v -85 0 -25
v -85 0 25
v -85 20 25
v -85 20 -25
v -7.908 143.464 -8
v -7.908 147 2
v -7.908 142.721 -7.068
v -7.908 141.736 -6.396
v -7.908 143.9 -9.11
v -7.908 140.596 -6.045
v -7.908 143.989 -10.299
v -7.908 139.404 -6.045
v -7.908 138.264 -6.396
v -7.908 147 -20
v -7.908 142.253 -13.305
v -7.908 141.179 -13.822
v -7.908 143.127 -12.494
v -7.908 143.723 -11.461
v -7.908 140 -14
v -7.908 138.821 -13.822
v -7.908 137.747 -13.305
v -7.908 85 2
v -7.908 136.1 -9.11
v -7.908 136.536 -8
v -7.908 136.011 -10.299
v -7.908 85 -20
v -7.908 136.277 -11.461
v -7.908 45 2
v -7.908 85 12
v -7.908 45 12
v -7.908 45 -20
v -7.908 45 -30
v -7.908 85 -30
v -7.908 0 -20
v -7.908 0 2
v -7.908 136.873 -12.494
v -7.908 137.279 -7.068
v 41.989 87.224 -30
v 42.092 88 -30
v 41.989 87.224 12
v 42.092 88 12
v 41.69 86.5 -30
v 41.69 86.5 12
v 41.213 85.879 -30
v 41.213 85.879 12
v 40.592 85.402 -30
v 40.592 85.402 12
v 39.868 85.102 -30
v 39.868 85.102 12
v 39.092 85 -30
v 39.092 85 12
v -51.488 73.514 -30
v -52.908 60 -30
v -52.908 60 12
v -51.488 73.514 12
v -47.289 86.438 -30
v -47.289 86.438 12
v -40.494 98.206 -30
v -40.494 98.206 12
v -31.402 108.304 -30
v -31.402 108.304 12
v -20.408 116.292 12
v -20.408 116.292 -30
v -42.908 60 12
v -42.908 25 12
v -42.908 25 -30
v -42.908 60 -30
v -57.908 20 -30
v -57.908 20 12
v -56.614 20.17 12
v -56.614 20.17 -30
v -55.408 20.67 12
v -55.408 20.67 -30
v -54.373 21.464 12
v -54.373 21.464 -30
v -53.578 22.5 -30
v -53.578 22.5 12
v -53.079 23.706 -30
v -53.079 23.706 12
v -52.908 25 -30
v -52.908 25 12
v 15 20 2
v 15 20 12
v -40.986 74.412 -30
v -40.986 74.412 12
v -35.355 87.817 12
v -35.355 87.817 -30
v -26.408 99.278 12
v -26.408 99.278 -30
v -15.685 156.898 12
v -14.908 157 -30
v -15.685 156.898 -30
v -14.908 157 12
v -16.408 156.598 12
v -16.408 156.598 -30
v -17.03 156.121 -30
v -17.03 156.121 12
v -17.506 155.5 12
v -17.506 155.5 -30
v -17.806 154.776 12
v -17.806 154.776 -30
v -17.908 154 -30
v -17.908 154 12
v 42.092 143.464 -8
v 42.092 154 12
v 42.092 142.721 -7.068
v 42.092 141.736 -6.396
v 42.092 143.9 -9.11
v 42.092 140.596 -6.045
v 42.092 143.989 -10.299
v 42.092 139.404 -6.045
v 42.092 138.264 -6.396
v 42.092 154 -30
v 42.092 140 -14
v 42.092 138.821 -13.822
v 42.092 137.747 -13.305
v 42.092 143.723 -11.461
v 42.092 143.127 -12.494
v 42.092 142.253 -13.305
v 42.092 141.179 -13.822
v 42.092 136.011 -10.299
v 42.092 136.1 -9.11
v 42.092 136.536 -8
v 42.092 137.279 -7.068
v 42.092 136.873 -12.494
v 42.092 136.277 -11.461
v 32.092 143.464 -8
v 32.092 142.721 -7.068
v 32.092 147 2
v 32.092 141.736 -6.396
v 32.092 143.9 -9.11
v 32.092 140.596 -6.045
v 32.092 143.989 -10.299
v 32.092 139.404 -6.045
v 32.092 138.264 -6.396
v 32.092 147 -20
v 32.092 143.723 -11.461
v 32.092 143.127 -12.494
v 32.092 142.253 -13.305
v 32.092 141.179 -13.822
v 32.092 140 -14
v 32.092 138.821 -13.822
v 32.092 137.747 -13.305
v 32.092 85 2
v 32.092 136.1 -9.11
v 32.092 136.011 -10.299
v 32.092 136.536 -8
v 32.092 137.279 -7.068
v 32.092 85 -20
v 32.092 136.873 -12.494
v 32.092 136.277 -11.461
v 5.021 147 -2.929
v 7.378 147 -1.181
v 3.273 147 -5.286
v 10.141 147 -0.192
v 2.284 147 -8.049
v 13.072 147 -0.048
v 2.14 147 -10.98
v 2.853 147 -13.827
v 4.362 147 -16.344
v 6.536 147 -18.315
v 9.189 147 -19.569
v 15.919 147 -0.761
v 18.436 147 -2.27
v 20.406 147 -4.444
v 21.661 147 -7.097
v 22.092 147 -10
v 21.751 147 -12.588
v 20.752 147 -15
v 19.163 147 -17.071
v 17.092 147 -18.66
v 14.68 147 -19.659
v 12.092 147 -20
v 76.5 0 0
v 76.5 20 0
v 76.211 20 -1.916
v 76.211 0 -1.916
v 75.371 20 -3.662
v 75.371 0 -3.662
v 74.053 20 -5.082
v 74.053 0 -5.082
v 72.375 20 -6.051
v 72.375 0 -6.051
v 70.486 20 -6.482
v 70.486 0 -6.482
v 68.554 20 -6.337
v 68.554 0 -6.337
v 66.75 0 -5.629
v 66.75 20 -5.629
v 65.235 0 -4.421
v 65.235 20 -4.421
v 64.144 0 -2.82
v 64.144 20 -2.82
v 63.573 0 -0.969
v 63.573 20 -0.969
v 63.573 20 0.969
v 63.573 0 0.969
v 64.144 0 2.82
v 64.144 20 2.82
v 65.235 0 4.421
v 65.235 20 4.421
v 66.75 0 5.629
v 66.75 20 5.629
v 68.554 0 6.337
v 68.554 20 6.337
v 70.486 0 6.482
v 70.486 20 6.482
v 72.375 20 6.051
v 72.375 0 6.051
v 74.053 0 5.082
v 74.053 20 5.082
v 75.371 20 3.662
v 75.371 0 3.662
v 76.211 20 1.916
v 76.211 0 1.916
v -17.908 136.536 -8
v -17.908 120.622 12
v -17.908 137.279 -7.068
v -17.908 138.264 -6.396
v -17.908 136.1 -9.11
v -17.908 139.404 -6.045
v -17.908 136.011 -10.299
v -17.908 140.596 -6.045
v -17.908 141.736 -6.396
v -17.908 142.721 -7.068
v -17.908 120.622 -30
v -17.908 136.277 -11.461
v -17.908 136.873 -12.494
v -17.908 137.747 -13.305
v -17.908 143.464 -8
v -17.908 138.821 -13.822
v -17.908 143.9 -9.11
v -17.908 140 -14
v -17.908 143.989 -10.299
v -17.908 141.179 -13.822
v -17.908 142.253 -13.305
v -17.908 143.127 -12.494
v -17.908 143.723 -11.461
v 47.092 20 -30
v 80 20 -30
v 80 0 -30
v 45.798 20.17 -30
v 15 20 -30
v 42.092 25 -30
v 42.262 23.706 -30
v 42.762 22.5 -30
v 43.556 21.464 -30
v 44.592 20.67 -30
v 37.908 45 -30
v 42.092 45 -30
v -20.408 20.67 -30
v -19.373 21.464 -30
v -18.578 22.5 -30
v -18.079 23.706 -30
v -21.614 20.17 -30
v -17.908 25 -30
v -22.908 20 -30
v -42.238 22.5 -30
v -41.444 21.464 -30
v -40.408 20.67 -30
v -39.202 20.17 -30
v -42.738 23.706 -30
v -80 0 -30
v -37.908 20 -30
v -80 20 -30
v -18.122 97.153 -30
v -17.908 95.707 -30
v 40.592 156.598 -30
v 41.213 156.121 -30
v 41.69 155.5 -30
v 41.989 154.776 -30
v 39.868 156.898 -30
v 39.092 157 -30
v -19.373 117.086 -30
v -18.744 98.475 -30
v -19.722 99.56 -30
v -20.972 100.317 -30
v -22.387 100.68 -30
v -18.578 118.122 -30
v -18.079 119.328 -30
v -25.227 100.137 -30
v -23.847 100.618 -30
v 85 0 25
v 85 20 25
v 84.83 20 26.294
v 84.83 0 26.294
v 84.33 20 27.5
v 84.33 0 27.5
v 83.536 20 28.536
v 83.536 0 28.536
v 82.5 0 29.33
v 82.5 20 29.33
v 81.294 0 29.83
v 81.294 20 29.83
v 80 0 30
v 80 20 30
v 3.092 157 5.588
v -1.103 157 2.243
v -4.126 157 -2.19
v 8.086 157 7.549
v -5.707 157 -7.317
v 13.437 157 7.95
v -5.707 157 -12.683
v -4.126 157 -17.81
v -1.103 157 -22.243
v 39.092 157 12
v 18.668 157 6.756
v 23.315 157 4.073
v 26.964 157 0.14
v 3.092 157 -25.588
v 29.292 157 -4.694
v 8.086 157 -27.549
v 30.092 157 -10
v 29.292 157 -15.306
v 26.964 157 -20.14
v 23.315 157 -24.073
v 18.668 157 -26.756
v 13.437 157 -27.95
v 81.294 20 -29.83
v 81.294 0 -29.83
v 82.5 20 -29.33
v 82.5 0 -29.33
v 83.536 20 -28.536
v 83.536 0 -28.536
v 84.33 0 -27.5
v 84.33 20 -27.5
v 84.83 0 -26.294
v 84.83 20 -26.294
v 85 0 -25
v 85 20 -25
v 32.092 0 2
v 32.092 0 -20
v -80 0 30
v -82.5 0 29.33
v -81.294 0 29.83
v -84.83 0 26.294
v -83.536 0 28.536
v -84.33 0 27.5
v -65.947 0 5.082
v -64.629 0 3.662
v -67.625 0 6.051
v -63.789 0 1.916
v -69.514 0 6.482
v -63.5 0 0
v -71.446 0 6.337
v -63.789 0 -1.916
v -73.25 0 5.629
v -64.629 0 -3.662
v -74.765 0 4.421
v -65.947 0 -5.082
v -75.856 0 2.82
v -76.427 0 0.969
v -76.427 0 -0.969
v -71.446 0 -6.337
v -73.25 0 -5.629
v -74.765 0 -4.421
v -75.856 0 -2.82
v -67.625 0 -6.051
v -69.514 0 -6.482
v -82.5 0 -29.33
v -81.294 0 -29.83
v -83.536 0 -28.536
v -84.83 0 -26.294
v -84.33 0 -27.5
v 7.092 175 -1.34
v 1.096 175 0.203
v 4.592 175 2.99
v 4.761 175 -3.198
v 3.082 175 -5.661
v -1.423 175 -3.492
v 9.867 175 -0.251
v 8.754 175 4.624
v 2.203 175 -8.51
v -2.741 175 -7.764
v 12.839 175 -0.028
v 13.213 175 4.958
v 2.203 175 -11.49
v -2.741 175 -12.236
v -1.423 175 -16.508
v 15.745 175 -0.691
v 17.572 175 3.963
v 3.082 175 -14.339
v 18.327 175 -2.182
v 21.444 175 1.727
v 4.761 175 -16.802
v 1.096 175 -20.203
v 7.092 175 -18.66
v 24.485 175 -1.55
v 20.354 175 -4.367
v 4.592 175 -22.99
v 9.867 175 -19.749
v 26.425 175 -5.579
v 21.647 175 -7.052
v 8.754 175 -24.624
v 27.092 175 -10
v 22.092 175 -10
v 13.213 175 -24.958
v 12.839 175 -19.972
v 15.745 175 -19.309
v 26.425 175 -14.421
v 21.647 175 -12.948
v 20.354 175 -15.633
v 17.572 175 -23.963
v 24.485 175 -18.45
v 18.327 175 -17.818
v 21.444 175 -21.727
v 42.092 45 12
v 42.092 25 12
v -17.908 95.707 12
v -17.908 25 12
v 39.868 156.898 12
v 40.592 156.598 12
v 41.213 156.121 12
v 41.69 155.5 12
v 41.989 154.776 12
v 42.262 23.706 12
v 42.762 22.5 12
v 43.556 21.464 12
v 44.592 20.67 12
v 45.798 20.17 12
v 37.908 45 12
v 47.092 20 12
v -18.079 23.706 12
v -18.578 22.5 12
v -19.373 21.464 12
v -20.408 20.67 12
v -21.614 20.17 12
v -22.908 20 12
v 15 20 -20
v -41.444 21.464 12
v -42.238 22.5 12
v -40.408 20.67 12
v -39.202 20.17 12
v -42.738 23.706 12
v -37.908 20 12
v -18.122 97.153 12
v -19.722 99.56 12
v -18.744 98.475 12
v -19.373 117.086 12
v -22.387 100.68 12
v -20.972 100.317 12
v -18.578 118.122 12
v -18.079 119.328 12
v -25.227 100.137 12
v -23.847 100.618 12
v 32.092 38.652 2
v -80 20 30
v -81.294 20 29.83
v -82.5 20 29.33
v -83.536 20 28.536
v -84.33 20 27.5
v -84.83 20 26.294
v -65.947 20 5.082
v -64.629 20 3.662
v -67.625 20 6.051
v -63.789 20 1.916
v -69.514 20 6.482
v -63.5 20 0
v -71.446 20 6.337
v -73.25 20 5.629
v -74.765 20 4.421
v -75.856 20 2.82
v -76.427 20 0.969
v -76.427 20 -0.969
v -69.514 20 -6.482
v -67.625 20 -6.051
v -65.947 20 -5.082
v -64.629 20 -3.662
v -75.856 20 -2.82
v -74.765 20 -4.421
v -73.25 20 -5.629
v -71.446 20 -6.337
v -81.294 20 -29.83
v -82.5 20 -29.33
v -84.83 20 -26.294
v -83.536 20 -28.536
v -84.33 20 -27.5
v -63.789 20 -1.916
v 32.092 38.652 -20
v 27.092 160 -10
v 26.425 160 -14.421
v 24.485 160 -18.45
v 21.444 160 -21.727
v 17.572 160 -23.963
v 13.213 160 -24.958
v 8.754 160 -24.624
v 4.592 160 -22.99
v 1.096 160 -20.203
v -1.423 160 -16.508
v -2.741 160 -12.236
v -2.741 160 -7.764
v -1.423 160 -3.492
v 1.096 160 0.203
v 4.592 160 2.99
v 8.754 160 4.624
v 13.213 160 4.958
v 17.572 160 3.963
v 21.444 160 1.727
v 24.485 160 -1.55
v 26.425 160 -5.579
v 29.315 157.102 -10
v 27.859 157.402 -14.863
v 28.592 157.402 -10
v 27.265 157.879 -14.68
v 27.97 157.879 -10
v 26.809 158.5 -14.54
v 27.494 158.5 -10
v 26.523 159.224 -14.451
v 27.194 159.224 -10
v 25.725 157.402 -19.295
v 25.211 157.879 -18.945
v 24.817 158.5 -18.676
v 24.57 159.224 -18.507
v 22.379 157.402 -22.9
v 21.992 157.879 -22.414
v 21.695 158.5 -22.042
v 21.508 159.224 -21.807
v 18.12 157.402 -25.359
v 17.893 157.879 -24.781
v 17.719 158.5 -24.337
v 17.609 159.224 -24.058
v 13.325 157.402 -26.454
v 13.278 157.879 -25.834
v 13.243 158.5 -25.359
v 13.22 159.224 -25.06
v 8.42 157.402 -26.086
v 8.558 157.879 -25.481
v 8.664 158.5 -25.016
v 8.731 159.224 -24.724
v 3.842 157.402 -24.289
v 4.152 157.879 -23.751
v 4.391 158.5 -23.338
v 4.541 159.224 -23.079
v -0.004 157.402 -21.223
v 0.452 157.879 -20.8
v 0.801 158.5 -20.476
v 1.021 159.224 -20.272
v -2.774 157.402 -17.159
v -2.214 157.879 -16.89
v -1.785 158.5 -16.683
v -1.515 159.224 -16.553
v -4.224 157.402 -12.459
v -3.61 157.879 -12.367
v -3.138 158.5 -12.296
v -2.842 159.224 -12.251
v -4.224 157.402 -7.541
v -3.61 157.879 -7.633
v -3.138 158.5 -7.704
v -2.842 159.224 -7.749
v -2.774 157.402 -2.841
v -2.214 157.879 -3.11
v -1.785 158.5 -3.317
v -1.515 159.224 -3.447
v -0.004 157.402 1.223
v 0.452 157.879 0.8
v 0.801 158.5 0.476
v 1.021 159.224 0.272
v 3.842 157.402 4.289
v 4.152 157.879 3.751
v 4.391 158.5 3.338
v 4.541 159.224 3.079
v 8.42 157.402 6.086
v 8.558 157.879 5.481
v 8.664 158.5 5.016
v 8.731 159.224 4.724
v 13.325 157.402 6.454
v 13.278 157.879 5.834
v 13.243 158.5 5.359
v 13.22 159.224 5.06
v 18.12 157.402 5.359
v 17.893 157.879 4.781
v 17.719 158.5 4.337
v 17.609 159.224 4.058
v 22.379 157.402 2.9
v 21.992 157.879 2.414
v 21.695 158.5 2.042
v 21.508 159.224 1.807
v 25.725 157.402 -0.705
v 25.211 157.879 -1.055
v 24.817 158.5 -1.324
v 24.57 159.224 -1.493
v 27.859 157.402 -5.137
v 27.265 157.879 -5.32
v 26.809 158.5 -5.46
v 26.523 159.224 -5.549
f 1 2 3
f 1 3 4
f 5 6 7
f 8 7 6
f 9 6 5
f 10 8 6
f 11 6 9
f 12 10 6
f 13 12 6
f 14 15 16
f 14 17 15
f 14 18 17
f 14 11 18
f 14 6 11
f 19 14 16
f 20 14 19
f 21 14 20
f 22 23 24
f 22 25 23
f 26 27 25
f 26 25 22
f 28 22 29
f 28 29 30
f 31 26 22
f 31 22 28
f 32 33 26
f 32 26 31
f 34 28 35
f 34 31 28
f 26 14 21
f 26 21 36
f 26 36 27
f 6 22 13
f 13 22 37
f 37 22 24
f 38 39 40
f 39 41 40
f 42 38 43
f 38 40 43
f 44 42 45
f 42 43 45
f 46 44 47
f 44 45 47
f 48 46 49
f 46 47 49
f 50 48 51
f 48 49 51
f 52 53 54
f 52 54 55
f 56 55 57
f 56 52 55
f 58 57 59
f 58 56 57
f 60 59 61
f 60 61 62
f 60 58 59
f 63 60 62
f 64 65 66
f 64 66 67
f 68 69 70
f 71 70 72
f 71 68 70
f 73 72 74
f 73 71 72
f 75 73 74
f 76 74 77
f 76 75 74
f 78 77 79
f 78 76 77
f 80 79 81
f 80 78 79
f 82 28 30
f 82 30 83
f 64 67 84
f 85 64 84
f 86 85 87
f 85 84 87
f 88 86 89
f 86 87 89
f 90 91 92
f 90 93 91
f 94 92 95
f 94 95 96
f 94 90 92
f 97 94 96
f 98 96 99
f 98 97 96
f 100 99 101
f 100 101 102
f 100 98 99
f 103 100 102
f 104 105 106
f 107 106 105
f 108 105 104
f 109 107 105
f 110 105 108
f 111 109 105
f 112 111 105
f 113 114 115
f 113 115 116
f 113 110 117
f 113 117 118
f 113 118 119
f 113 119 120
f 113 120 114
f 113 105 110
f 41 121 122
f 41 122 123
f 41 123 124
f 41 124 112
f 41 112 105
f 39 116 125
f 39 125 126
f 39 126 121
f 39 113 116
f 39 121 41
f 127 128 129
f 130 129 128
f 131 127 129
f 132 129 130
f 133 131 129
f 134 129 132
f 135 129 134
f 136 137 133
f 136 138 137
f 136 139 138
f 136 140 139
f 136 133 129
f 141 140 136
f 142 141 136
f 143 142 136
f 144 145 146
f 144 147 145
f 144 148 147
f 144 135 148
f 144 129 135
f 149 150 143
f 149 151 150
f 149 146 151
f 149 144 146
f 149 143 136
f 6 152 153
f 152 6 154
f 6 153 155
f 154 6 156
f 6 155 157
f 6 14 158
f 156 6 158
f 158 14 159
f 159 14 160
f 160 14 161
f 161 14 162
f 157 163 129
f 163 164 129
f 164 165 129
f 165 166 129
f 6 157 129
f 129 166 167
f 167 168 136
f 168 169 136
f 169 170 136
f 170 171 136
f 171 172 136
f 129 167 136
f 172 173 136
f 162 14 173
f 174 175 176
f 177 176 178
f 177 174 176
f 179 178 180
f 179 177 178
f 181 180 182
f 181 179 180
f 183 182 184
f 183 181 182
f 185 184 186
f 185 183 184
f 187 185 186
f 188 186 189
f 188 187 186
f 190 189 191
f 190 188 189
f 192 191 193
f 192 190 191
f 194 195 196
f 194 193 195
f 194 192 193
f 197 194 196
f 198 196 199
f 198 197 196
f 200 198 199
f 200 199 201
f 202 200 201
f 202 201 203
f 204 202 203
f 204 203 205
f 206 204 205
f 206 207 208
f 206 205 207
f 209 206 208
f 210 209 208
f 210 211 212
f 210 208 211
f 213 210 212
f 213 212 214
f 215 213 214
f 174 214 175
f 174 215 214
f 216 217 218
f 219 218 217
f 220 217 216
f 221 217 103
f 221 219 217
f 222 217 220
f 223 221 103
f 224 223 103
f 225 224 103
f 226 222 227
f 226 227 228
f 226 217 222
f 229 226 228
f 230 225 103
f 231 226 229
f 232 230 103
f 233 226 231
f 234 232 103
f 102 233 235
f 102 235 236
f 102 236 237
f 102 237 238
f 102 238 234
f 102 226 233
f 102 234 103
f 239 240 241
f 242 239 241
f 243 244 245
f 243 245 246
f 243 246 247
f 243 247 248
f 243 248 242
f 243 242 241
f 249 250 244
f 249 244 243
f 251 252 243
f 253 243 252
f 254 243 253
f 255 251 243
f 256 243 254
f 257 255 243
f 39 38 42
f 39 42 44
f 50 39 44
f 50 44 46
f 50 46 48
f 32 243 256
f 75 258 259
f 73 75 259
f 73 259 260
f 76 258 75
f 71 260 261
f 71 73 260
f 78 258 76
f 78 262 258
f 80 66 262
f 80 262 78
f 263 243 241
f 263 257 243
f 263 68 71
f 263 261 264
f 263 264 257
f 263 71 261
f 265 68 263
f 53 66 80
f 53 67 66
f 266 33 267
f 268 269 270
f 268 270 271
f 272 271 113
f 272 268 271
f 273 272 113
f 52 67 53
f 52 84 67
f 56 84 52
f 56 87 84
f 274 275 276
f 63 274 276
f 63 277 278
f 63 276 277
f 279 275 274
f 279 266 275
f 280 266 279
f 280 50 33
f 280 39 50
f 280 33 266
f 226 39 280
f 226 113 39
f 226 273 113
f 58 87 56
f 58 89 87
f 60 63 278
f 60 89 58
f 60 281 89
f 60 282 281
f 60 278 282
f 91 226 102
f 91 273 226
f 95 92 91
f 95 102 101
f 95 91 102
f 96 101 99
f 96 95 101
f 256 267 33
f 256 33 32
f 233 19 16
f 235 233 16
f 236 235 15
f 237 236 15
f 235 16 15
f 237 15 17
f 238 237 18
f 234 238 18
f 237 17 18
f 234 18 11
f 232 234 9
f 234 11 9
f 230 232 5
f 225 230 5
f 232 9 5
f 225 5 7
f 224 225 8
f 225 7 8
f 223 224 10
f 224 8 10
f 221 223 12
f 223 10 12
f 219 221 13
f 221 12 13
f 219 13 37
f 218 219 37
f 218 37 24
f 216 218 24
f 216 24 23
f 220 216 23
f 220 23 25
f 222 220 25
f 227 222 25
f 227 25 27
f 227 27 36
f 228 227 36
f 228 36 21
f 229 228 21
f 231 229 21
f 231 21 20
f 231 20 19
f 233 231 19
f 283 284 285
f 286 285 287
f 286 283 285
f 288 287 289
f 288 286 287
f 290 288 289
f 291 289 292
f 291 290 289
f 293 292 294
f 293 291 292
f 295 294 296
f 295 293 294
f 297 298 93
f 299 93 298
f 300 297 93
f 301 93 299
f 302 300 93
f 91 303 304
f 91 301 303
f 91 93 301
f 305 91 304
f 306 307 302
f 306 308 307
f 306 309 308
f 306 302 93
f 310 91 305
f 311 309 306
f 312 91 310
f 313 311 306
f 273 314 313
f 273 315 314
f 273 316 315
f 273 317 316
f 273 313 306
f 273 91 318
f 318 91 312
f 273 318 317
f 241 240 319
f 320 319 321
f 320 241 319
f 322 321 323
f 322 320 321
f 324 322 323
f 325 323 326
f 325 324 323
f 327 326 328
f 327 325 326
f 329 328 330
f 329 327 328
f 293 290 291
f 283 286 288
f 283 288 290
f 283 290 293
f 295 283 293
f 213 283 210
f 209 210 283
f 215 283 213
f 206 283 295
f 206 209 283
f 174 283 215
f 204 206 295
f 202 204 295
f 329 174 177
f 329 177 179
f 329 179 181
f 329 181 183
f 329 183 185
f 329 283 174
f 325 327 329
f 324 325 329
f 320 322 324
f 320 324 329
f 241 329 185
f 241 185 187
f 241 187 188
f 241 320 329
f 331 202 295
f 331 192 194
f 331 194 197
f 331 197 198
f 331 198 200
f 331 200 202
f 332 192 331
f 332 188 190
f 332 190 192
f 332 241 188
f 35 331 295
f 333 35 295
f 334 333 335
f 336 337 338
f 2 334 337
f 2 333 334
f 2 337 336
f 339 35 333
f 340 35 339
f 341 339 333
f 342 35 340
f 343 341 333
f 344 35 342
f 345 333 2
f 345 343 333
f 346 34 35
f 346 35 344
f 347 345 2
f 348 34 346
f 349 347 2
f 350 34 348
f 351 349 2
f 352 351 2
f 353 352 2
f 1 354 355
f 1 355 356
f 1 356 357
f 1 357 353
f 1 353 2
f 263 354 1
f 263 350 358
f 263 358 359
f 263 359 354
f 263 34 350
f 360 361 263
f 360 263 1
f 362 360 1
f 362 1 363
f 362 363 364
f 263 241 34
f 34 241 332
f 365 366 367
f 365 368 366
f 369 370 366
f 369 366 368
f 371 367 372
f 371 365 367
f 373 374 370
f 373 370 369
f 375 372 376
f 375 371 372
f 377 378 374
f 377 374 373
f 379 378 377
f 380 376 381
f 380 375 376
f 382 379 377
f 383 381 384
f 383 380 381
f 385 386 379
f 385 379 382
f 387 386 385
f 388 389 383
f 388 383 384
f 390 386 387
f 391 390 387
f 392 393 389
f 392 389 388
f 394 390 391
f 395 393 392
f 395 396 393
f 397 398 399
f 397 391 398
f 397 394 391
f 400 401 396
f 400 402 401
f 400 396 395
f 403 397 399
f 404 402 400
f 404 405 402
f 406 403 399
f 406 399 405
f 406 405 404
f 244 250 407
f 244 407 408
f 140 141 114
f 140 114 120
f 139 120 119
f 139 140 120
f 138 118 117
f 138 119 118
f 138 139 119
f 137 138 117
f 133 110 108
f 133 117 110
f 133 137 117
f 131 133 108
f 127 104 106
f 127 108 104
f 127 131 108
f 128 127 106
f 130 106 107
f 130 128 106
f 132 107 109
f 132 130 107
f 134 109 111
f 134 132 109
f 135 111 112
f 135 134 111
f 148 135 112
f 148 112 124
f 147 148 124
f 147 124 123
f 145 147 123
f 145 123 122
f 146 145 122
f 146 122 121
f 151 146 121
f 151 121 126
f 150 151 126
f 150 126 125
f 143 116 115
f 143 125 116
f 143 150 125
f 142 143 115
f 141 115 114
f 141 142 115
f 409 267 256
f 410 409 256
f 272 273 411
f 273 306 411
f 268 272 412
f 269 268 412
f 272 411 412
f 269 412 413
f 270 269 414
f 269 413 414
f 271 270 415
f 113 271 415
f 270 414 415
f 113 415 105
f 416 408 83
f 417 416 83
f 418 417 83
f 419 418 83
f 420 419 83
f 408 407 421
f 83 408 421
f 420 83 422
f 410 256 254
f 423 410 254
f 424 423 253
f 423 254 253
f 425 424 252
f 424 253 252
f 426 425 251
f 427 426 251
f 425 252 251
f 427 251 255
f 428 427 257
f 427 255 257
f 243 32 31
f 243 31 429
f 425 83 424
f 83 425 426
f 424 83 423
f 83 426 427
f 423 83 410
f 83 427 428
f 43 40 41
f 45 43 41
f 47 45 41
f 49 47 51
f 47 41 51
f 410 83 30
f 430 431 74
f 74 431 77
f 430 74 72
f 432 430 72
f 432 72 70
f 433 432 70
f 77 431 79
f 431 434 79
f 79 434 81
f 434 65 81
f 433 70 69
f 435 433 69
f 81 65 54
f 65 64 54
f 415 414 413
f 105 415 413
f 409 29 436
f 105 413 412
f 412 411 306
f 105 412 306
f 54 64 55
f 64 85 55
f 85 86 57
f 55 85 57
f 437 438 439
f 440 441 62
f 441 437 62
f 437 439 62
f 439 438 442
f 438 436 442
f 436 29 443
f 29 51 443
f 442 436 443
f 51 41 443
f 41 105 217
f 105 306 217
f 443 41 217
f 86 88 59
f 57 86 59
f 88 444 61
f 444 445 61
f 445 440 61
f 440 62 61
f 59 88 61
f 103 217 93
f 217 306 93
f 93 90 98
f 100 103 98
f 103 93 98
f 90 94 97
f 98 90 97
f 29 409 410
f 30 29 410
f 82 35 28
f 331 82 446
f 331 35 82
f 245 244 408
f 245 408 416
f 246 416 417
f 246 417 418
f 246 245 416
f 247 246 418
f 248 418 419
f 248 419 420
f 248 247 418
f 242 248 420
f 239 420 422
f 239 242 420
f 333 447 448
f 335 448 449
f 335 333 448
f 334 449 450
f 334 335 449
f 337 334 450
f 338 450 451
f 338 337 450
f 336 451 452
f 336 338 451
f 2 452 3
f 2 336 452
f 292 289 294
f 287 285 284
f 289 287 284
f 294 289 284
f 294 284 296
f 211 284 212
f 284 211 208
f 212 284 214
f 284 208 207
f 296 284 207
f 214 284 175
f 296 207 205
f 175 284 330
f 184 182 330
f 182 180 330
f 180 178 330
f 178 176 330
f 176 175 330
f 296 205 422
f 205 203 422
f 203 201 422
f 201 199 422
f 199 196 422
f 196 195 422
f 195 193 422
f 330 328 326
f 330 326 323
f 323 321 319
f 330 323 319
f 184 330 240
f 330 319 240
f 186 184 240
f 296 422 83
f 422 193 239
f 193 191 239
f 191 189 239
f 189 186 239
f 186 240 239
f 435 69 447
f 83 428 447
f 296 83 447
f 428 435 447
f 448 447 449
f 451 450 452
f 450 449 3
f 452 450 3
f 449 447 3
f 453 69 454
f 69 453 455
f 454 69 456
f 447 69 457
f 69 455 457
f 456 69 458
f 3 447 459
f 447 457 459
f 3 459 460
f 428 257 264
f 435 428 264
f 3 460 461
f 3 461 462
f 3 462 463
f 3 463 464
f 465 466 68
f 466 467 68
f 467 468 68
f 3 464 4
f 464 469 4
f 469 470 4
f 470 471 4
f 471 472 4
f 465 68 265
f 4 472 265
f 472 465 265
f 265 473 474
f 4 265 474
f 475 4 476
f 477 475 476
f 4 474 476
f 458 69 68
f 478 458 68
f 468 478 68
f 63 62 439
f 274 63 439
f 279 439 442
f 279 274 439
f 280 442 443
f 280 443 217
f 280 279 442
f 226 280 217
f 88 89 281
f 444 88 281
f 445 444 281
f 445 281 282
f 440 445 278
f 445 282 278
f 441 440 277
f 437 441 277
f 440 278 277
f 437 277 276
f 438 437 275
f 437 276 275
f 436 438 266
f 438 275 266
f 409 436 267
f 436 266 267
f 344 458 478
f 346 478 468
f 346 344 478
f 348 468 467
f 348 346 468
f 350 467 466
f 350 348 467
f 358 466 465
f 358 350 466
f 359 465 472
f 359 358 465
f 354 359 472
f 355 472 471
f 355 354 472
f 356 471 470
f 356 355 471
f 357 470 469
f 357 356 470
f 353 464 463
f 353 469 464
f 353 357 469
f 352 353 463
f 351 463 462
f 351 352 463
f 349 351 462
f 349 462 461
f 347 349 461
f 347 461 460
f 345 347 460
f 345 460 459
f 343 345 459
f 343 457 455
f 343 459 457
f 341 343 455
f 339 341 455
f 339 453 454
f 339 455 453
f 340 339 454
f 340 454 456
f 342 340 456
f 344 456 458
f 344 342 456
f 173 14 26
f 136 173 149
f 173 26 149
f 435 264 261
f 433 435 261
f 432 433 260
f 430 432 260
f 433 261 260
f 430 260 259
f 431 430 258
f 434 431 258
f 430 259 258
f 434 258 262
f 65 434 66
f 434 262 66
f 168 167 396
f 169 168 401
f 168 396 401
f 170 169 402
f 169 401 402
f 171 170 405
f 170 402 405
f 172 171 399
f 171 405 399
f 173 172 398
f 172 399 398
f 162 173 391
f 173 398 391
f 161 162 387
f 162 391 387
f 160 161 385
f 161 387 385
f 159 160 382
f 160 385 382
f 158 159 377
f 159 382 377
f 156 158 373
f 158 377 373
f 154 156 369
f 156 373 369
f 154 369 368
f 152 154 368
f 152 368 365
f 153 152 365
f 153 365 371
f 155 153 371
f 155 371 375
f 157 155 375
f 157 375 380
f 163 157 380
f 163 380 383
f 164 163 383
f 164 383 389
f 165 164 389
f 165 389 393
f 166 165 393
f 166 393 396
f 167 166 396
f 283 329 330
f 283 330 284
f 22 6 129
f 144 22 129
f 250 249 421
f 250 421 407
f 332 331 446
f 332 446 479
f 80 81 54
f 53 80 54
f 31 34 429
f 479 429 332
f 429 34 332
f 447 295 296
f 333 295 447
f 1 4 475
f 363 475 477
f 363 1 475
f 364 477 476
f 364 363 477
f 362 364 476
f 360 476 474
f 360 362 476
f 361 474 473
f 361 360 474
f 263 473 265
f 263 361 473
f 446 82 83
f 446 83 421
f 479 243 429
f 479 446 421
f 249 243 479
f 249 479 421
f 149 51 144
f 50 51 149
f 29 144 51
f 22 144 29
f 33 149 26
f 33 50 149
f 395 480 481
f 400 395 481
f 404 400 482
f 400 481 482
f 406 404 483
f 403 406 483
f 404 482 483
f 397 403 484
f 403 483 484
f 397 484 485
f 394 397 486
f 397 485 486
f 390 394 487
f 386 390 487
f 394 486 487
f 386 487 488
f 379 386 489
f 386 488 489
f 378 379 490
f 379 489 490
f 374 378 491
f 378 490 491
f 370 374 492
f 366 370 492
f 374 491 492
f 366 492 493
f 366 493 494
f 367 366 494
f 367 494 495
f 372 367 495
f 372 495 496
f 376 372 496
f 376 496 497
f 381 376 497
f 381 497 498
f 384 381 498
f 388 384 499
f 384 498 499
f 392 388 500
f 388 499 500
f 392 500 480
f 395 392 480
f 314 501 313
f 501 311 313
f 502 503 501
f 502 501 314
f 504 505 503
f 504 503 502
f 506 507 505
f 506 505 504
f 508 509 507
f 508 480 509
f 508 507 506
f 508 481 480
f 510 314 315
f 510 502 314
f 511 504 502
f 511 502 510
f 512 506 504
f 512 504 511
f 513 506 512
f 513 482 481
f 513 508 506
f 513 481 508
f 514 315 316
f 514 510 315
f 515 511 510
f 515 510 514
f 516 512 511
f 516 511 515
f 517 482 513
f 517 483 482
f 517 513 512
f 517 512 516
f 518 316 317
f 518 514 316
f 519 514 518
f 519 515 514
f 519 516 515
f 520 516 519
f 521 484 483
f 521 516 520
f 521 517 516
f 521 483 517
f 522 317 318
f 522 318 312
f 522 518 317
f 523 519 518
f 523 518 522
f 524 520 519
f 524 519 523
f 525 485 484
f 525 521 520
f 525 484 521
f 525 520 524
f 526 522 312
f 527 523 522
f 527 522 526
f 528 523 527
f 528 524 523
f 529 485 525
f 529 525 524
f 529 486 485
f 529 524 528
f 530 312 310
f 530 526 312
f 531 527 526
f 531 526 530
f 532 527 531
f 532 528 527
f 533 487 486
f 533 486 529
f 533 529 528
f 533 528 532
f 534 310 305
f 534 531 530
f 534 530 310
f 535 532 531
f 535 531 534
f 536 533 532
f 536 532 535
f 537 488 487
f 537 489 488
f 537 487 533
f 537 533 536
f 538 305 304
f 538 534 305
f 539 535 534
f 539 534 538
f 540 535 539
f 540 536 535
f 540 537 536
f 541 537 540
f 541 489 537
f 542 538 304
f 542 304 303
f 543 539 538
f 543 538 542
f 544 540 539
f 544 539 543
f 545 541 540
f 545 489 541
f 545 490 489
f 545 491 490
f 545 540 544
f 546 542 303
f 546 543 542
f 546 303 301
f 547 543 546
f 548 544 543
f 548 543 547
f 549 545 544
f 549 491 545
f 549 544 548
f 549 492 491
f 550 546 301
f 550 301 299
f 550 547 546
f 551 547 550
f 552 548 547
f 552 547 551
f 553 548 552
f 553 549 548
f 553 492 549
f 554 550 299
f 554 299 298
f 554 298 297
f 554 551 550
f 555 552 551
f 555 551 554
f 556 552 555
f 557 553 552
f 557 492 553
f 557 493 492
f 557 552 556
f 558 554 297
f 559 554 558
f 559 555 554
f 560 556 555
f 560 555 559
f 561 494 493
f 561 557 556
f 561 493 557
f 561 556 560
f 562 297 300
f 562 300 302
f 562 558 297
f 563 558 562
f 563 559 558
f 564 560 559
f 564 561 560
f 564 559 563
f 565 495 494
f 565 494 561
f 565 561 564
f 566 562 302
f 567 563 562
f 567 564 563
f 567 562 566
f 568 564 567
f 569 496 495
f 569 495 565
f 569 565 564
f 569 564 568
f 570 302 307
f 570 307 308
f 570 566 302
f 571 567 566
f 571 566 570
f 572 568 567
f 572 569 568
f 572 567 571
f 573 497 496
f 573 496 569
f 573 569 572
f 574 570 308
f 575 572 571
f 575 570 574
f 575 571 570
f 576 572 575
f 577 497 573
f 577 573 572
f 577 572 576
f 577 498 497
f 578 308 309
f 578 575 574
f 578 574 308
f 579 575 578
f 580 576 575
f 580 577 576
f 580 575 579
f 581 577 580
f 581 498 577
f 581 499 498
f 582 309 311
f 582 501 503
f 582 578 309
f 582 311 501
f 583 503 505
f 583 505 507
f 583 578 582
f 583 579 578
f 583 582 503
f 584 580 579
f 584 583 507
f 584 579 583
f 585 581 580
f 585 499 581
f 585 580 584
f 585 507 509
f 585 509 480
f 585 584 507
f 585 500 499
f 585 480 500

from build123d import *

# Parameters (mm, degrees)
BOSS_EXTRUDE1_DEPTH     = 20
BOSS_EXTRUDE4_START     = -30
BOSS_EXTRUDE4_DEPTH     = 42
SKETCH10_W              = 40
SKETCH10_H              = 22
CUT_EXTRUDE3_DEPTH      = 147
SKETCH11_R              = 15
BOSS_EXTRUDE5_DEPTH     = 18
CUT_EXTRUDE4_REACH      = 177
SKETCH12_R              = 10
FILLET1_R               = 3
SKETCH13_R              = 4
CUT_EXTRUDE5_DEPTH      = 86
CUT_EXTRUDE5_DEPTH_BACK = 86
CUT_EXTRUDE7_REACH      = 177
SKETCH16_R              = 6.5


with BuildPart() as part:
    # Sketch1 → Boss-Extrude1 (new body)
    with BuildSketch(Plane(origin=(0, 0, 0), x_dir=(1, 0, 0), z_dir=(0, 1, 0))):
        with BuildLine():
            Line((-80, 30), (80, 30))
            ThreePointArc((80, 30), (83.535533906, 28.535533906), (85, 25))
            Line((85, 25), (85, -25))
            ThreePointArc((85, -25), (83.535533906, -28.535533906), (80, -30))
            Line((80, -30), (-80, -30))
            ThreePointArc((-80, -30), (-83.535533906, -28.535533906), (-85, -25))
            Line((-85, -25), (-85, 25))
            ThreePointArc((-85, 25), (-83.535533906, 28.535533906), (-80, 30))
        make_face()
    extrude(amount=BOSS_EXTRUDE1_DEPTH)

    # Sketch2 → Boss-Extrude4 (add)
    with BuildSketch(Plane.XY.offset(BOSS_EXTRUDE4_START)):
        with BuildLine():
            Line((-17.90827935, 157), (42.09172065, 157))
            Line((42.09172065, 157), (42.09172065, 85))
            Line((42.09172065, 85), (-7.90827935, 85))
            Line((-7.90827935, 85), (-7.90827935, 45))
            Line((-7.90827935, 45), (15, 20))
            Line((15, 20), (37.90827935, 45))
            Line((37.90827935, 45), (42.09172065, 45))
            Line((42.09172065, 45), (42.09172065, 25))
            ThreePointArc((42.09172065, 25), (43.556186744, 21.464466094), (47.09172065, 20))
            Line((47.09172065, 20), (50, 20))
            Line((50, 20), (50, 17))
            Line((50, 17), (-58, 17))
            Line((-58, 17), (-58, 20))
            Line((-58, 20), (-57.90827935, 20))
            ThreePointArc((-57.90827935, 20), (-54.372745445, 21.464466094), (-52.90827935, 25))
            Line((-52.90827935, 25), (-52.90827935, 60))
            ThreePointArc((-52.90827935, 60), (-44.199930596, 92.5), (-20.40827935, 116.291651246))
            ThreePointArc((-20.40827935, 116.291651246), (-18.578152332, 118.121778265), (-17.90827935, 120.621778265))
            Line((-17.90827935, 120.621778265), (-17.90827935, 157))
        make_face()
        with BuildLine():
            Line((-17.90827935, 95.707142143), (-17.90827935, 25))
            ThreePointArc((-17.90827935, 25), (-19.372745445, 21.464466094), (-22.90827935, 20))
            Line((-22.90827935, 20), (-37.90827935, 20))
            ThreePointArc((-37.90827935, 20), (-41.443813256, 21.464466094), (-42.90827935, 25))
            Line((-42.90827935, 25), (-42.90827935, 60))
            ThreePointArc((-42.90827935, 60), (-38.615773866, 81.301408404), (-26.40827935, 99.277856357))
            ThreePointArc((-26.40827935, 99.277856357), (-20.971787677, 100.316914371), (-17.90827935, 95.707142143))
        make_face(mode=Mode.SUBTRACT)
    extrude(amount=BOSS_EXTRUDE4_DEPTH)

    # Sketch10 → Cut-Extrude3 (cut)
    with BuildSketch(Plane(origin=(0, 0, 0), x_dir=(1, 0, 0), z_dir=(0, 1, 0))):
        with Locations((12.09172065, 9)):
            Rectangle(SKETCH10_W, SKETCH10_H)
    extrude(amount=CUT_EXTRUDE3_DEPTH, mode=Mode.SUBTRACT)

    # Sketch11 → Boss-Extrude5 (add)
    with BuildSketch(Plane(origin=(0, 157, 0), x_dir=(1, 0, 0), z_dir=(0, 1, 0))):
        with Locations((12.09172065, 10)):
            Circle(SKETCH11_R)
    extrude(amount=BOSS_EXTRUDE5_DEPTH)

    # Sketch12 → Cut-Extrude4 (cut, up to next)
    with BuildSketch(Plane(origin=(0, 175, 0), x_dir=(1, 0, 0), z_dir=(0, 1, 0)), mode=Mode.PRIVATE) as cut_extrude4_sk1:
        with Locations((12.09172065, 10)):
            Circle(SKETCH12_R)
    cut_extrude4_tool1 = extrude(cut_extrude4_sk1.sketch, amount=-CUT_EXTRUDE4_REACH, mode=Mode.PRIVATE) & part.part
    add(cut_extrude4_tool1.solids().sort_by_distance((12.091721, 175, -10))[0], mode=Mode.SUBTRACT)

    # Fillet1
    fillet1_edges = [part.edges().sort_by_distance(p)[0] for p in [
        (-2.90827935, 157, -10),
        (42.09172065, 85, -9),
        (42.09172065, 157, -9),
        (-17.90827935, 157, -9),
    ]]
    fillet(fillet1_edges, radius=FILLET1_R)

    # Sketch13 → Cut-Extrude5 (cut, two sides)
    with BuildSketch(Plane(origin=(0, 0, 0), x_dir=(0, 0, -1), z_dir=(1, 0, 0))) as cut_extrude5_sk:
        with Locations((10, 140)):
            Circle(SKETCH13_R)
    extrude(amount=CUT_EXTRUDE5_DEPTH, mode=Mode.SUBTRACT)
    extrude(cut_extrude5_sk.sketch, amount=-CUT_EXTRUDE5_DEPTH_BACK, mode=Mode.SUBTRACT)

    # Sketch16 → Cut-Extrude7 (cut, up to next)
    with BuildSketch(Plane(origin=(0, 0, 0), x_dir=(1, 0, 0), z_dir=(0, 1, 0)), mode=Mode.PRIVATE) as cut_extrude7_sk1:
        with Locations((-70, 0)):
            Circle(SKETCH16_R)
    cut_extrude7_tool1 = extrude(cut_extrude7_sk1.sketch, amount=CUT_EXTRUDE7_REACH, mode=Mode.PRIVATE) & part.part
    add(cut_extrude7_tool1.solids().sort_by_distance((-70, 0, 0))[0], mode=Mode.SUBTRACT)
    # Sketch16 → Cut-Extrude7 (cut, up to next)
    with BuildSketch(Plane(origin=(0, 0, 0), x_dir=(1, 0, 0), z_dir=(0, 1, 0)), mode=Mode.PRIVATE) as cut_extrude7_sk2:
        with Locations((70, 0)):
            Circle(SKETCH16_R)
    cut_extrude7_tool2 = extrude(cut_extrude7_sk2.sketch, amount=CUT_EXTRUDE7_REACH, mode=Mode.PRIVATE) & part.part
    add(cut_extrude7_tool2.solids().sort_by_distance((70, 0, 0))[0], mode=Mode.SUBTRACT)


solid = part.part
